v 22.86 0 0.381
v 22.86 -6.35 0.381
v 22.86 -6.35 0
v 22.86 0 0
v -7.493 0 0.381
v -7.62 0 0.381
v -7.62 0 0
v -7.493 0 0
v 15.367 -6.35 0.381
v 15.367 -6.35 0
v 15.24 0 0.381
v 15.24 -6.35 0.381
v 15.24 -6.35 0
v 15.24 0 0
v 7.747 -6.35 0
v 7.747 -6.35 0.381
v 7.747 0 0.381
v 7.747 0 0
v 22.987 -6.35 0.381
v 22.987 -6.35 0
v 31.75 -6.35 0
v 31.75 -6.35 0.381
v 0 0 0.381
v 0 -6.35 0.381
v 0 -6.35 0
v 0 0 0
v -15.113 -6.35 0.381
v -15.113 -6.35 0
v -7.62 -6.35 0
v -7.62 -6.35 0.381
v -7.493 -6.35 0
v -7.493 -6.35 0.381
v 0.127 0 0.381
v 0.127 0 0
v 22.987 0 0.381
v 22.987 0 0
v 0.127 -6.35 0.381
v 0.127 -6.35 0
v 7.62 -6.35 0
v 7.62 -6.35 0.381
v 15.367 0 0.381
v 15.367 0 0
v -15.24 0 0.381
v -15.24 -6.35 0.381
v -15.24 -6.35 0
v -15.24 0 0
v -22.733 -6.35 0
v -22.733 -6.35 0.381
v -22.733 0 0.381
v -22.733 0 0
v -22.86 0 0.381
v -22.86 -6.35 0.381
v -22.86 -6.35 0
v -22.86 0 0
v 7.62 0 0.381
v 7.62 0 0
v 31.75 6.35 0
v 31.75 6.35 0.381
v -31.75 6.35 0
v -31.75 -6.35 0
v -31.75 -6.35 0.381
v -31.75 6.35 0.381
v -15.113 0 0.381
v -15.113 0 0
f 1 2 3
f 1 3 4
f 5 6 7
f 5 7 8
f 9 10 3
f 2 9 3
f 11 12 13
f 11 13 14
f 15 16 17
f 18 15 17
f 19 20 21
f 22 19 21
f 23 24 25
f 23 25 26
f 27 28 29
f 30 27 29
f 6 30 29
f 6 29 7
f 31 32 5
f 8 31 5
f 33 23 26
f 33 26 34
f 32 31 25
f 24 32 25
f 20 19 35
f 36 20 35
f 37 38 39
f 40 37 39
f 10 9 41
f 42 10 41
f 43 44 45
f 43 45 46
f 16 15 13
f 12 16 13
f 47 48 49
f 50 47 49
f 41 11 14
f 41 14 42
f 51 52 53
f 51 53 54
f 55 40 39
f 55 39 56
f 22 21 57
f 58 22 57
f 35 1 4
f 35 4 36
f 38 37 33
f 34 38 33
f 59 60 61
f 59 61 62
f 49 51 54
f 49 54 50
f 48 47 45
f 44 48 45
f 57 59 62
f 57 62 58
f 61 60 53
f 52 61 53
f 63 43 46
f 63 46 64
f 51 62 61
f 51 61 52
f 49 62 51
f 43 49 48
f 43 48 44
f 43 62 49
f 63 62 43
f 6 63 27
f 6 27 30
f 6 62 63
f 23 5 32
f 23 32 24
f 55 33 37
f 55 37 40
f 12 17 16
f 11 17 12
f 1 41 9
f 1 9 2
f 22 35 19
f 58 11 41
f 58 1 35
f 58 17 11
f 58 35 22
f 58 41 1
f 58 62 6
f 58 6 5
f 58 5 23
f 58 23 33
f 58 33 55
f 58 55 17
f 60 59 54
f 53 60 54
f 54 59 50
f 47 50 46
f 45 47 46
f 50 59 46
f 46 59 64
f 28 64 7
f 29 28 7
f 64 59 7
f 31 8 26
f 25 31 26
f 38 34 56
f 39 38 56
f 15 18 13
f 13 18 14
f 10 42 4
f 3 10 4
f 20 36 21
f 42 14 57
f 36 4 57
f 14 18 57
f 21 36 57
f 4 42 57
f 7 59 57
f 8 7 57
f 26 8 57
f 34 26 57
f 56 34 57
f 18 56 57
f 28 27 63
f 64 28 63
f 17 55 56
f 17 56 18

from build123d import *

# Parameters (mm, degrees)
SKETCH1_W           = 63.5
SKETCH1_H           = 12.7
BOSS_EXTRUDE1_DEPTH = 0.381
SKETCH2_W           = 0.127
SKETCH2_H           = 6.35
CUT_EXTRUDE1_DEPTH  = 1.381


with BuildPart() as part:
    # Sketch1 → Boss-Extrude1 (new body)
    with BuildSketch(Plane.XY):
        Rectangle(SKETCH1_W, SKETCH1_H)
    extrude(amount=BOSS_EXTRUDE1_DEPTH)

    # Sketch2 → Cut-Extrude1 (cut, through all)
    with BuildSketch(Plane.XY.offset(0.381)):
        with Locations((-22.7965, -3.175)):
            Rectangle(SKETCH2_W, SKETCH2_H)
        with Locations((-15.1765, -3.175)):
            Rectangle(SKETCH2_W, SKETCH2_H)
        with Locations((-7.5565, -3.175)):
            Rectangle(SKETCH2_W, SKETCH2_H)
        with Locations((0.0635, -3.175)):
            Rectangle(SKETCH2_W, SKETCH2_H)
        with Locations((7.6835, -3.175)):
            Rectangle(SKETCH2_W, SKETCH2_H)
        with Locations((15.3035, -3.175)):
            Rectangle(SKETCH2_W, SKETCH2_H)
        with Locations((22.9235, -3.175)):
            Rectangle(SKETCH2_W, SKETCH2_H)
    extrude(amount=-CUT_EXTRUDE1_DEPTH, mode=Mode.SUBTRACT)


solid = part.part
